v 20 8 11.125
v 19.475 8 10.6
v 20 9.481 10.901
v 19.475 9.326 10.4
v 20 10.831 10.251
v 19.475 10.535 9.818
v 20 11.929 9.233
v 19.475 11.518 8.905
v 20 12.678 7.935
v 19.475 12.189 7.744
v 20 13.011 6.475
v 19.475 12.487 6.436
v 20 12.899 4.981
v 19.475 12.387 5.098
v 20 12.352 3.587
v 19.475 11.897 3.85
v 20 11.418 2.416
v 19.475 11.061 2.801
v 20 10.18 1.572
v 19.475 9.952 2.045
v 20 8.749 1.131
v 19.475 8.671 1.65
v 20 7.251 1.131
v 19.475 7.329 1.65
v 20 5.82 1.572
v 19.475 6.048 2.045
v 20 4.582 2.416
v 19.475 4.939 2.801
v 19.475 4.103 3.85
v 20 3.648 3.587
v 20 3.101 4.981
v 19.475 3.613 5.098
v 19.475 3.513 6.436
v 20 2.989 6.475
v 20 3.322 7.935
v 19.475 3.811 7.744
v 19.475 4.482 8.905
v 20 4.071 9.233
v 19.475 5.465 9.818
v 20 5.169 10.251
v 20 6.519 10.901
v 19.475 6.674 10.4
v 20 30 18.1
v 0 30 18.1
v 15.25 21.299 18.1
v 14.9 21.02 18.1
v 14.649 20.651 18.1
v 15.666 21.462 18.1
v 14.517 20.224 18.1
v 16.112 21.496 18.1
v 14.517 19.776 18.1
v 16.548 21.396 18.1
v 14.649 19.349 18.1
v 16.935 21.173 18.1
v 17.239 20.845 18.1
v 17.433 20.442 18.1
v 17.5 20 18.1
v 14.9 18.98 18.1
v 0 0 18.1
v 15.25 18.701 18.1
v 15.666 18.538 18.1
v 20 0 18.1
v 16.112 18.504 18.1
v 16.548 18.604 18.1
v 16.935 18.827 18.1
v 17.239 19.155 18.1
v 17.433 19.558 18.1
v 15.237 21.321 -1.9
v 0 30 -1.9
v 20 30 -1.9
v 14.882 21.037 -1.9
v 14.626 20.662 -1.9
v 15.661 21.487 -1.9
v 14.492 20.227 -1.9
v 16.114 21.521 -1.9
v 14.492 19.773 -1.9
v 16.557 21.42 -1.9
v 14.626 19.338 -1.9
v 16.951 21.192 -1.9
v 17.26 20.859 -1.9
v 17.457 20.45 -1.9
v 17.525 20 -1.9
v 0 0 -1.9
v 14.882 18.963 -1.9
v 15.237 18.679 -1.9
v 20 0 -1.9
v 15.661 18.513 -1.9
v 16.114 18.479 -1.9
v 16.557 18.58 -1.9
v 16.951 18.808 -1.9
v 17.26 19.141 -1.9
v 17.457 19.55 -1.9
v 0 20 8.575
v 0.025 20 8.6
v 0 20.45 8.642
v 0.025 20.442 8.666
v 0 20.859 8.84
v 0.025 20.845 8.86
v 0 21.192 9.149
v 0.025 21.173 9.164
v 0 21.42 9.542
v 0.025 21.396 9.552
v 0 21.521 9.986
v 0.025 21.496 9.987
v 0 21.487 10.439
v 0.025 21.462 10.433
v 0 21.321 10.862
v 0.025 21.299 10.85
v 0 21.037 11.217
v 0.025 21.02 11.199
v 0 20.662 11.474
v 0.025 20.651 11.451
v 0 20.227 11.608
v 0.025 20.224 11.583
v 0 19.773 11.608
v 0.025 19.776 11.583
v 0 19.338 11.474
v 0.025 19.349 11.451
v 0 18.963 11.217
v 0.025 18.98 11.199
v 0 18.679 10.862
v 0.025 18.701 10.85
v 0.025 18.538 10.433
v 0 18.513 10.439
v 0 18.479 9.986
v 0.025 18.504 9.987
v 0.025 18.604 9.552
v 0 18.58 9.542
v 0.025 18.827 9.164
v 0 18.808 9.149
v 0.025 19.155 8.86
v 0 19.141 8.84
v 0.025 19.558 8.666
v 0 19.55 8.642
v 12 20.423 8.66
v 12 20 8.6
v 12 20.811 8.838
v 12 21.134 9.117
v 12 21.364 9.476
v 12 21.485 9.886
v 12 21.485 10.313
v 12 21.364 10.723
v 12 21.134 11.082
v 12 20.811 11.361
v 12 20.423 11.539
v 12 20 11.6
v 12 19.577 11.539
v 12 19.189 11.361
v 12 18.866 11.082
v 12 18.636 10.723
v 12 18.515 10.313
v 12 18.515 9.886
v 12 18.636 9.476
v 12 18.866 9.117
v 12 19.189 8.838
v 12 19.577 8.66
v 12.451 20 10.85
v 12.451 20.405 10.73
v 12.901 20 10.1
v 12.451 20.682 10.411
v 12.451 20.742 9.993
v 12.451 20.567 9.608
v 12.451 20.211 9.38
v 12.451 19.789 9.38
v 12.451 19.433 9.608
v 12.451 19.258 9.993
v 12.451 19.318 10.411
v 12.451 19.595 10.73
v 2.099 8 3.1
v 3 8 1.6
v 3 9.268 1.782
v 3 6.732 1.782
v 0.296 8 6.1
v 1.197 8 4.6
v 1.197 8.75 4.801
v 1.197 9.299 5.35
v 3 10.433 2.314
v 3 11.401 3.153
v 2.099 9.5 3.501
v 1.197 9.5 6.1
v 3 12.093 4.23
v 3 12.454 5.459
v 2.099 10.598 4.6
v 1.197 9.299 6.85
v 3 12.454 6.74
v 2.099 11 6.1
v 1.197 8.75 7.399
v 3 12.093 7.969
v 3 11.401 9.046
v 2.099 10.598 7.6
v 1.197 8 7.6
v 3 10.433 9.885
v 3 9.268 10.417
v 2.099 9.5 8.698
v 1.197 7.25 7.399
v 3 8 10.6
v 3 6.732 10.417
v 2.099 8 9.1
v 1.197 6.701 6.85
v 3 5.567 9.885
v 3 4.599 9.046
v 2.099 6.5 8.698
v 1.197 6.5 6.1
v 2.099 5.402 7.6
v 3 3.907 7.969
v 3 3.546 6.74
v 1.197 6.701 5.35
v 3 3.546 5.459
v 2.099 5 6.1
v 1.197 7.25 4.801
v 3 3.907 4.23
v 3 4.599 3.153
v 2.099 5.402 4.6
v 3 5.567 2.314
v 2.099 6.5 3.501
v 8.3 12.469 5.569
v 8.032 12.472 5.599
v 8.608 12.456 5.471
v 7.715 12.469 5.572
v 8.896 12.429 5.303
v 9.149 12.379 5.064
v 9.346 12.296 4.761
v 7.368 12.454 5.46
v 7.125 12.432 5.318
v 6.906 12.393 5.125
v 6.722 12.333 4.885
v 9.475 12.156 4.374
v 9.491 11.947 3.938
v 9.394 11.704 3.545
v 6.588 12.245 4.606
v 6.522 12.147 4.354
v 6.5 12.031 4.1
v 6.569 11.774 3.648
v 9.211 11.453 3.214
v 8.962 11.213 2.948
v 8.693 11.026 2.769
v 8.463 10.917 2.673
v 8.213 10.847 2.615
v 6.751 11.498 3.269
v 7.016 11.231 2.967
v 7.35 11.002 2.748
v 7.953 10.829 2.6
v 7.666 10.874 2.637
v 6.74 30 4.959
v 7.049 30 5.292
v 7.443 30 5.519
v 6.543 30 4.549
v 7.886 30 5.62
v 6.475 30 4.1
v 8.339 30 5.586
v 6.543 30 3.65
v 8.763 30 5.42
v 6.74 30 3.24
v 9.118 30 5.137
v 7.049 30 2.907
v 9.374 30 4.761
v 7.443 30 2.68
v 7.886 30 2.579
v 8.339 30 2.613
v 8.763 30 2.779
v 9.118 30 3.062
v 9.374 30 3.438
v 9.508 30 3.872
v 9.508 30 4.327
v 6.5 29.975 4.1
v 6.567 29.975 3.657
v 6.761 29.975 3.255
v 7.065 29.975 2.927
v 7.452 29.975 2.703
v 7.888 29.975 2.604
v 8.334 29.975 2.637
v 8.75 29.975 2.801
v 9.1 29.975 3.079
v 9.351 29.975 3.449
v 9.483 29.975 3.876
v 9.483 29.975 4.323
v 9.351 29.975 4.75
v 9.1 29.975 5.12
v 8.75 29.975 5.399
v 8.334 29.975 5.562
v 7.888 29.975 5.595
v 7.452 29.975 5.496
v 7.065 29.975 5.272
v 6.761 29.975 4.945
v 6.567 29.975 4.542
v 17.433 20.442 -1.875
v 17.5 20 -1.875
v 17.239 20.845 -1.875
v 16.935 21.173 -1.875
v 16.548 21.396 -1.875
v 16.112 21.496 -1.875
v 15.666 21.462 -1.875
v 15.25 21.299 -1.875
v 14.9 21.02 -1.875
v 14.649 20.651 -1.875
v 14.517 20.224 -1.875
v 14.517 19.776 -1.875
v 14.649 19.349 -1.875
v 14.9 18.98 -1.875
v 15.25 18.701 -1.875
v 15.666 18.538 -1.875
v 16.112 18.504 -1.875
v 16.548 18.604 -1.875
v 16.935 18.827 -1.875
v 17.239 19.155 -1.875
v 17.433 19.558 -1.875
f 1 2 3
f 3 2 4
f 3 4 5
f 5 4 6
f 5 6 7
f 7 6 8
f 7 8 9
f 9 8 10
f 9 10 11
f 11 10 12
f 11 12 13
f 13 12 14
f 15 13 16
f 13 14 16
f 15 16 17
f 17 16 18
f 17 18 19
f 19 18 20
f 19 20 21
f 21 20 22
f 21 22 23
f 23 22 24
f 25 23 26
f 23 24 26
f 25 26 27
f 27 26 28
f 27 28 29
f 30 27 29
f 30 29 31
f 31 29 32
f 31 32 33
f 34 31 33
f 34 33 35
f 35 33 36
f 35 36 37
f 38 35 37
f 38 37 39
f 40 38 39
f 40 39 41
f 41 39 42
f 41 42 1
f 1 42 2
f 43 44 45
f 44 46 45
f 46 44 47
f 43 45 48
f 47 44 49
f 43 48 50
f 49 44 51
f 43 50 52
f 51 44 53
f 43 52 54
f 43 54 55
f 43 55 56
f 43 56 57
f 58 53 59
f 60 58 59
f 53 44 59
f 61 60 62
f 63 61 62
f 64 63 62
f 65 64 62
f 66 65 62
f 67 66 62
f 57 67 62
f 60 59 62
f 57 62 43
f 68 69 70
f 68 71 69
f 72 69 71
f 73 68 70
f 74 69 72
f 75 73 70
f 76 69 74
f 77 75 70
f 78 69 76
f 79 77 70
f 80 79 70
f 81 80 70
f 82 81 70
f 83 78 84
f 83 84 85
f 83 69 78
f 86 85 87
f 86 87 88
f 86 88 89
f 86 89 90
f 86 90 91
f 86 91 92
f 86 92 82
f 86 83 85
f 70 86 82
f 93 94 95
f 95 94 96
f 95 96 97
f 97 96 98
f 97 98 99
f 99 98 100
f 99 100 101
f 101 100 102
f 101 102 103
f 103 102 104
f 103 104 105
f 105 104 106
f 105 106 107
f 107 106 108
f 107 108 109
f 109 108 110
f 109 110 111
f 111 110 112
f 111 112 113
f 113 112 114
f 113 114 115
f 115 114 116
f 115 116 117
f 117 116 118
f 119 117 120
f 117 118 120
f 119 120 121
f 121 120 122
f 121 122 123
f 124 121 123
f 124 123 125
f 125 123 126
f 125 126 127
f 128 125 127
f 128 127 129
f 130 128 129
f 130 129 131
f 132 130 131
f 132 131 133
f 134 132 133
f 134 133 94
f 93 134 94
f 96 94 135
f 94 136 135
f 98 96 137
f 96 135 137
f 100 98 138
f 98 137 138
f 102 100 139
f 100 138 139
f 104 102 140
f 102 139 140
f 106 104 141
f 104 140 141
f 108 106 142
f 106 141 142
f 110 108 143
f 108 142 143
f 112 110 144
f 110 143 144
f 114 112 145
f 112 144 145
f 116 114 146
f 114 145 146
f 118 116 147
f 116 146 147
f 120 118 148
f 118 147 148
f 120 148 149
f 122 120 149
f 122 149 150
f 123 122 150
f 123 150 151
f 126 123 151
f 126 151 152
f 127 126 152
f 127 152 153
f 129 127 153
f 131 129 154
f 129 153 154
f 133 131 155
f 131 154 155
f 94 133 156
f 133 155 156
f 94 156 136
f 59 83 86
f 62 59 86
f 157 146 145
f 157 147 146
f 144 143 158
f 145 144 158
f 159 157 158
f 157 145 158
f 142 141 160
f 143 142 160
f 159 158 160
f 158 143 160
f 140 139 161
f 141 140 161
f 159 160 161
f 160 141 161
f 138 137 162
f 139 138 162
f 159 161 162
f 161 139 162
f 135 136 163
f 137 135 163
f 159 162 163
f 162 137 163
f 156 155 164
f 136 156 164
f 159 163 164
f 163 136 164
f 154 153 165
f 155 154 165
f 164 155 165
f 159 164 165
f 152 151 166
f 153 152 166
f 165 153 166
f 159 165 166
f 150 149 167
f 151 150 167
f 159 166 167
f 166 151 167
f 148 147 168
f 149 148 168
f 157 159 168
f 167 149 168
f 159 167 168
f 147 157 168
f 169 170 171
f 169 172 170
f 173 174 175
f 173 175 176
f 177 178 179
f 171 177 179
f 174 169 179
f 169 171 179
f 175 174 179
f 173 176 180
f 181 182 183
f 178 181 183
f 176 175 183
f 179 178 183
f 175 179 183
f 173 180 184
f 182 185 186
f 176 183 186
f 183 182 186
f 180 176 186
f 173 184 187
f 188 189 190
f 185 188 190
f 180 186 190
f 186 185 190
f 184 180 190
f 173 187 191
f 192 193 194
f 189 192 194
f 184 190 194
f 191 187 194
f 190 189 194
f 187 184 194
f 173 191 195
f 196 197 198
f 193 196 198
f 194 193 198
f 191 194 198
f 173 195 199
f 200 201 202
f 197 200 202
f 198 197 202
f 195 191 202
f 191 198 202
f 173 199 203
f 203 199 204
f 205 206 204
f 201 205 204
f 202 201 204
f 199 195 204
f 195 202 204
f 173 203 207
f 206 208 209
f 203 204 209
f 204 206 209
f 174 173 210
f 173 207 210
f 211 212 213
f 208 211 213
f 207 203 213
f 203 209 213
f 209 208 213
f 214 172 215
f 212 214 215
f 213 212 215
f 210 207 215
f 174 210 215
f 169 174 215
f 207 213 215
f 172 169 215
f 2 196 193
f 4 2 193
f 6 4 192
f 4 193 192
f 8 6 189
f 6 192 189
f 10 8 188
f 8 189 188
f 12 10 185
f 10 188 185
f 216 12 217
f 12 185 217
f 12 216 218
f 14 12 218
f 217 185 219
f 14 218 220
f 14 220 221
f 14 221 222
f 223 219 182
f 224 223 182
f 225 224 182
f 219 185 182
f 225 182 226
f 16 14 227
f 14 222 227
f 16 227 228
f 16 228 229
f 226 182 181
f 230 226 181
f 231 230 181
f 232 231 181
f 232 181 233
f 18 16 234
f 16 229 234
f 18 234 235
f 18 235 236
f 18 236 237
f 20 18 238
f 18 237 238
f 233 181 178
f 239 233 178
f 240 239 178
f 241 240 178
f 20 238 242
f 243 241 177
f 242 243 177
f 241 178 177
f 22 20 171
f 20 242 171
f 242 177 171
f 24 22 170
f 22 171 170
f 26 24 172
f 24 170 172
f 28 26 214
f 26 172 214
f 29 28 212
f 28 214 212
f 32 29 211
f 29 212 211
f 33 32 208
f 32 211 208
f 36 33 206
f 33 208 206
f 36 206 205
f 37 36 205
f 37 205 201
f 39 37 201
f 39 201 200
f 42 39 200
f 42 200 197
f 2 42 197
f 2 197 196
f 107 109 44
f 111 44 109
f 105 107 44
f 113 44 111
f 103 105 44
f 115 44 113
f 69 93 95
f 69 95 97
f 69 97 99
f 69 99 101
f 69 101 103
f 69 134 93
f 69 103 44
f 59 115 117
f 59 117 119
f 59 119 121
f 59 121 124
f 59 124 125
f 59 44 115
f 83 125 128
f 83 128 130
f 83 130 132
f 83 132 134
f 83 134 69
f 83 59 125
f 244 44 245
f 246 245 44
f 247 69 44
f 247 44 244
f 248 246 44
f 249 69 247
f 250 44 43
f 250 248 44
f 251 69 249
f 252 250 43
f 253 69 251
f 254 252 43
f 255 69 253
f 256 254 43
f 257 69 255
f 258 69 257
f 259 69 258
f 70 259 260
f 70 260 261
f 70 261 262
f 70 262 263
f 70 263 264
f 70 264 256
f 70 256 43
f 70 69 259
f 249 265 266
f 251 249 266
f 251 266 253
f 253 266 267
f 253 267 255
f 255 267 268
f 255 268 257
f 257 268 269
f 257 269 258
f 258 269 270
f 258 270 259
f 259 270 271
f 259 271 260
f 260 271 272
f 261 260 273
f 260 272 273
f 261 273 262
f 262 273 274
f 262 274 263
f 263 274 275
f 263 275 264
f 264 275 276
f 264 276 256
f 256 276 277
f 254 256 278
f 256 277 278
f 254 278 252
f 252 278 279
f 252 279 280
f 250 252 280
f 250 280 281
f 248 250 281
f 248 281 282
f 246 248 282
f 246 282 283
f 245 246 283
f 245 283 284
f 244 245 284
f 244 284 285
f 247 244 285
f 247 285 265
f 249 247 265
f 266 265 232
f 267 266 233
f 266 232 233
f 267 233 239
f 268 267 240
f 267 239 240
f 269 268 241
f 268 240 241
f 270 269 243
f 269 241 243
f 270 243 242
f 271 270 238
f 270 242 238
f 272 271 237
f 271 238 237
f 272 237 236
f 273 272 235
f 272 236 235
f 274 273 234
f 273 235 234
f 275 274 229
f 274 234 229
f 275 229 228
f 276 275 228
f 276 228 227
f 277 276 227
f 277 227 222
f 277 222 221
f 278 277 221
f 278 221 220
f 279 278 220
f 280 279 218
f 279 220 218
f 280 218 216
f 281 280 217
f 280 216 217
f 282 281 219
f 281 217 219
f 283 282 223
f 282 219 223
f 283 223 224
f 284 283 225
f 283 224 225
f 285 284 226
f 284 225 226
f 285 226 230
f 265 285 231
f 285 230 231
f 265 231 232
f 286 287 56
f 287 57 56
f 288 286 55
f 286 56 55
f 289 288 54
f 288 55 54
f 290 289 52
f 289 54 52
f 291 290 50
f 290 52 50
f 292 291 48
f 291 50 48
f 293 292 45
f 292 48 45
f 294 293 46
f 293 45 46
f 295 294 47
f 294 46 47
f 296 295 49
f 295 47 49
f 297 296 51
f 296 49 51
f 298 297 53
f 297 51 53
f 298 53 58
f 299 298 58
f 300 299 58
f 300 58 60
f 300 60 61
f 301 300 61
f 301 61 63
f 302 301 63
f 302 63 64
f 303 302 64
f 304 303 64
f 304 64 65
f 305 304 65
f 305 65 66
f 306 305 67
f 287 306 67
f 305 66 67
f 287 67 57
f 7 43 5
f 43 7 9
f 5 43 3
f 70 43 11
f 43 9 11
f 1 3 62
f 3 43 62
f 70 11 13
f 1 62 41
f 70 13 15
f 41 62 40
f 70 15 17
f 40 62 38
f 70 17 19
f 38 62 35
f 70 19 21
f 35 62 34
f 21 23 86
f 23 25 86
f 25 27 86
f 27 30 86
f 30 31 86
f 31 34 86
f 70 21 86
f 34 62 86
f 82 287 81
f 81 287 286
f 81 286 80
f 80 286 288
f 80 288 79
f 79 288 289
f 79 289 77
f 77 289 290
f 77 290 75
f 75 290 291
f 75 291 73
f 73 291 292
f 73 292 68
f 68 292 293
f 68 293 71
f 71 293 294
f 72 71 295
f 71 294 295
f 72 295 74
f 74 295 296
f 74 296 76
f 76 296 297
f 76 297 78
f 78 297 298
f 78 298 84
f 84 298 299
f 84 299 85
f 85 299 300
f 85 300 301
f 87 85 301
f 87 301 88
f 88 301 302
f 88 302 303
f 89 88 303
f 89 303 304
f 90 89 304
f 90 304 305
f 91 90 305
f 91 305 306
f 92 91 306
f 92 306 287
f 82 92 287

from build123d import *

# Parameters (mm, degrees)
SKETCH1_W                        = 20
SKETCH1_H                        = 20
BOSS_EXTRUDE1_DEPTH              = 30
F_3_0MM_DOWEL_HOLE1_D            = 3
F_3_0MM_DOWEL_HOLE1_DEPTH        = 20
F_3_0MM_DOWEL_HOLE1_CSINK_D      = 3.05
F_3_0MM_DOWEL_HOLE1_CSINK_ANGLE  = 90
F_3_0MM_DOWEL_HOLE1_TIP          = 0.901290929
F_3_0MM_DOWEL_HOLE2_D            = 3
F_3_0MM_DOWEL_HOLE2_DEPTH        = 12
F_3_0MM_DOWEL_HOLE2_CSINK_D      = 3.05
F_3_0MM_DOWEL_HOLE2_CSINK_ANGLE  = 90
F_3_0MM_DOWEL_HOLE2_TIP          = 0.901290929
F_3_0MM_DOWEL_HOLE3_D            = 3
F_3_0MM_DOWEL_HOLE3_DEPTH        = 20
F_3_0MM_DOWEL_HOLE3_CSINK_D      = 3.05
F_3_0MM_DOWEL_HOLE3_CSINK_ANGLE  = 90
F_3_0MM_DOWEL_HOLE3_TIP          = 0.901290929
F_10_0MM_DOWEL_HOLE1_D           = 9
F_10_0MM_DOWEL_HOLE1_DEPTH       = 17
F_10_0MM_DOWEL_HOLE1_CSINK_D     = 10.05
F_10_0MM_DOWEL_HOLE1_CSINK_ANGLE = 90
F_10_0MM_DOWEL_HOLE1_TIP         = 2.703872786


with BuildPart() as part:
    # Sketch1 → Boss-Extrude1 (new body)
    with BuildSketch(Plane(origin=(0, 0, 0), x_dir=(1, 0, 0), z_dir=(0, 1, 0))):
        with Locations((10, -8.099538279)):
            Rectangle(SKETCH1_W, SKETCH1_H)
    extrude(amount=BOSS_EXTRUDE1_DEPTH)

    # Ø3.0mm Dowel Hole1
    with Locations(Plane(origin=(0, 0, -1.900461721), x_dir=(-1, 0, 0), z_dir=(0, 0, -1))):
        with Locations((-16, 20)):
            CounterSinkHole(F_3_0MM_DOWEL_HOLE1_D / 2, F_3_0MM_DOWEL_HOLE1_CSINK_D / 2, depth=F_3_0MM_DOWEL_HOLE1_DEPTH, counter_sink_angle=F_3_0MM_DOWEL_HOLE1_CSINK_ANGLE)
            with Locations((0, 0, -(F_3_0MM_DOWEL_HOLE1_DEPTH + F_3_0MM_DOWEL_HOLE1_TIP / 2))):  # 118° drill point
                Cone(0, F_3_0MM_DOWEL_HOLE1_D / 2, F_3_0MM_DOWEL_HOLE1_TIP, mode=Mode.SUBTRACT)

    # Ø3.0mm Dowel Hole2
    with Locations(Plane.ZY):
        with Locations((10.099538279, 20)):
            CounterSinkHole(F_3_0MM_DOWEL_HOLE2_D / 2, F_3_0MM_DOWEL_HOLE2_CSINK_D / 2, depth=F_3_0MM_DOWEL_HOLE2_DEPTH, counter_sink_angle=F_3_0MM_DOWEL_HOLE2_CSINK_ANGLE)
            with Locations((0, 0, -(F_3_0MM_DOWEL_HOLE2_DEPTH + F_3_0MM_DOWEL_HOLE2_TIP / 2))):  # 118° drill point
                Cone(0, F_3_0MM_DOWEL_HOLE2_D / 2, F_3_0MM_DOWEL_HOLE2_TIP, mode=Mode.SUBTRACT)

    # Ø3.0mm Dowel Hole3
    with Locations(Plane(origin=(0, 30, 0), x_dir=(1, 0, 0), z_dir=(0, 1, 0))):
        with Locations((8, -4.099538279)):
            CounterSinkHole(F_3_0MM_DOWEL_HOLE3_D / 2, F_3_0MM_DOWEL_HOLE3_CSINK_D / 2, depth=F_3_0MM_DOWEL_HOLE3_DEPTH, counter_sink_angle=F_3_0MM_DOWEL_HOLE3_CSINK_ANGLE)
            with Locations((0, 0, -(F_3_0MM_DOWEL_HOLE3_DEPTH + F_3_0MM_DOWEL_HOLE3_TIP / 2))):  # 118° drill point
                Cone(0, F_3_0MM_DOWEL_HOLE3_D / 2, F_3_0MM_DOWEL_HOLE3_TIP, mode=Mode.SUBTRACT)

    # Ø10.0mm Dowel Hole1
    with Locations(Plane(origin=(20, 0, 0), x_dir=(0, 0, -1), z_dir=(1, 0, 0))):
        with Locations((-6.099538279, 8)):
            CounterSinkHole(F_10_0MM_DOWEL_HOLE1_D / 2, F_10_0MM_DOWEL_HOLE1_CSINK_D / 2, depth=F_10_0MM_DOWEL_HOLE1_DEPTH, counter_sink_angle=F_10_0MM_DOWEL_HOLE1_CSINK_ANGLE)
            with Locations((0, 0, -(F_10_0MM_DOWEL_HOLE1_DEPTH + F_10_0MM_DOWEL_HOLE1_TIP / 2))):  # 118° drill point
                Cone(0, F_10_0MM_DOWEL_HOLE1_D / 2, F_10_0MM_DOWEL_HOLE1_TIP, mode=Mode.SUBTRACT)


solid = part.part
